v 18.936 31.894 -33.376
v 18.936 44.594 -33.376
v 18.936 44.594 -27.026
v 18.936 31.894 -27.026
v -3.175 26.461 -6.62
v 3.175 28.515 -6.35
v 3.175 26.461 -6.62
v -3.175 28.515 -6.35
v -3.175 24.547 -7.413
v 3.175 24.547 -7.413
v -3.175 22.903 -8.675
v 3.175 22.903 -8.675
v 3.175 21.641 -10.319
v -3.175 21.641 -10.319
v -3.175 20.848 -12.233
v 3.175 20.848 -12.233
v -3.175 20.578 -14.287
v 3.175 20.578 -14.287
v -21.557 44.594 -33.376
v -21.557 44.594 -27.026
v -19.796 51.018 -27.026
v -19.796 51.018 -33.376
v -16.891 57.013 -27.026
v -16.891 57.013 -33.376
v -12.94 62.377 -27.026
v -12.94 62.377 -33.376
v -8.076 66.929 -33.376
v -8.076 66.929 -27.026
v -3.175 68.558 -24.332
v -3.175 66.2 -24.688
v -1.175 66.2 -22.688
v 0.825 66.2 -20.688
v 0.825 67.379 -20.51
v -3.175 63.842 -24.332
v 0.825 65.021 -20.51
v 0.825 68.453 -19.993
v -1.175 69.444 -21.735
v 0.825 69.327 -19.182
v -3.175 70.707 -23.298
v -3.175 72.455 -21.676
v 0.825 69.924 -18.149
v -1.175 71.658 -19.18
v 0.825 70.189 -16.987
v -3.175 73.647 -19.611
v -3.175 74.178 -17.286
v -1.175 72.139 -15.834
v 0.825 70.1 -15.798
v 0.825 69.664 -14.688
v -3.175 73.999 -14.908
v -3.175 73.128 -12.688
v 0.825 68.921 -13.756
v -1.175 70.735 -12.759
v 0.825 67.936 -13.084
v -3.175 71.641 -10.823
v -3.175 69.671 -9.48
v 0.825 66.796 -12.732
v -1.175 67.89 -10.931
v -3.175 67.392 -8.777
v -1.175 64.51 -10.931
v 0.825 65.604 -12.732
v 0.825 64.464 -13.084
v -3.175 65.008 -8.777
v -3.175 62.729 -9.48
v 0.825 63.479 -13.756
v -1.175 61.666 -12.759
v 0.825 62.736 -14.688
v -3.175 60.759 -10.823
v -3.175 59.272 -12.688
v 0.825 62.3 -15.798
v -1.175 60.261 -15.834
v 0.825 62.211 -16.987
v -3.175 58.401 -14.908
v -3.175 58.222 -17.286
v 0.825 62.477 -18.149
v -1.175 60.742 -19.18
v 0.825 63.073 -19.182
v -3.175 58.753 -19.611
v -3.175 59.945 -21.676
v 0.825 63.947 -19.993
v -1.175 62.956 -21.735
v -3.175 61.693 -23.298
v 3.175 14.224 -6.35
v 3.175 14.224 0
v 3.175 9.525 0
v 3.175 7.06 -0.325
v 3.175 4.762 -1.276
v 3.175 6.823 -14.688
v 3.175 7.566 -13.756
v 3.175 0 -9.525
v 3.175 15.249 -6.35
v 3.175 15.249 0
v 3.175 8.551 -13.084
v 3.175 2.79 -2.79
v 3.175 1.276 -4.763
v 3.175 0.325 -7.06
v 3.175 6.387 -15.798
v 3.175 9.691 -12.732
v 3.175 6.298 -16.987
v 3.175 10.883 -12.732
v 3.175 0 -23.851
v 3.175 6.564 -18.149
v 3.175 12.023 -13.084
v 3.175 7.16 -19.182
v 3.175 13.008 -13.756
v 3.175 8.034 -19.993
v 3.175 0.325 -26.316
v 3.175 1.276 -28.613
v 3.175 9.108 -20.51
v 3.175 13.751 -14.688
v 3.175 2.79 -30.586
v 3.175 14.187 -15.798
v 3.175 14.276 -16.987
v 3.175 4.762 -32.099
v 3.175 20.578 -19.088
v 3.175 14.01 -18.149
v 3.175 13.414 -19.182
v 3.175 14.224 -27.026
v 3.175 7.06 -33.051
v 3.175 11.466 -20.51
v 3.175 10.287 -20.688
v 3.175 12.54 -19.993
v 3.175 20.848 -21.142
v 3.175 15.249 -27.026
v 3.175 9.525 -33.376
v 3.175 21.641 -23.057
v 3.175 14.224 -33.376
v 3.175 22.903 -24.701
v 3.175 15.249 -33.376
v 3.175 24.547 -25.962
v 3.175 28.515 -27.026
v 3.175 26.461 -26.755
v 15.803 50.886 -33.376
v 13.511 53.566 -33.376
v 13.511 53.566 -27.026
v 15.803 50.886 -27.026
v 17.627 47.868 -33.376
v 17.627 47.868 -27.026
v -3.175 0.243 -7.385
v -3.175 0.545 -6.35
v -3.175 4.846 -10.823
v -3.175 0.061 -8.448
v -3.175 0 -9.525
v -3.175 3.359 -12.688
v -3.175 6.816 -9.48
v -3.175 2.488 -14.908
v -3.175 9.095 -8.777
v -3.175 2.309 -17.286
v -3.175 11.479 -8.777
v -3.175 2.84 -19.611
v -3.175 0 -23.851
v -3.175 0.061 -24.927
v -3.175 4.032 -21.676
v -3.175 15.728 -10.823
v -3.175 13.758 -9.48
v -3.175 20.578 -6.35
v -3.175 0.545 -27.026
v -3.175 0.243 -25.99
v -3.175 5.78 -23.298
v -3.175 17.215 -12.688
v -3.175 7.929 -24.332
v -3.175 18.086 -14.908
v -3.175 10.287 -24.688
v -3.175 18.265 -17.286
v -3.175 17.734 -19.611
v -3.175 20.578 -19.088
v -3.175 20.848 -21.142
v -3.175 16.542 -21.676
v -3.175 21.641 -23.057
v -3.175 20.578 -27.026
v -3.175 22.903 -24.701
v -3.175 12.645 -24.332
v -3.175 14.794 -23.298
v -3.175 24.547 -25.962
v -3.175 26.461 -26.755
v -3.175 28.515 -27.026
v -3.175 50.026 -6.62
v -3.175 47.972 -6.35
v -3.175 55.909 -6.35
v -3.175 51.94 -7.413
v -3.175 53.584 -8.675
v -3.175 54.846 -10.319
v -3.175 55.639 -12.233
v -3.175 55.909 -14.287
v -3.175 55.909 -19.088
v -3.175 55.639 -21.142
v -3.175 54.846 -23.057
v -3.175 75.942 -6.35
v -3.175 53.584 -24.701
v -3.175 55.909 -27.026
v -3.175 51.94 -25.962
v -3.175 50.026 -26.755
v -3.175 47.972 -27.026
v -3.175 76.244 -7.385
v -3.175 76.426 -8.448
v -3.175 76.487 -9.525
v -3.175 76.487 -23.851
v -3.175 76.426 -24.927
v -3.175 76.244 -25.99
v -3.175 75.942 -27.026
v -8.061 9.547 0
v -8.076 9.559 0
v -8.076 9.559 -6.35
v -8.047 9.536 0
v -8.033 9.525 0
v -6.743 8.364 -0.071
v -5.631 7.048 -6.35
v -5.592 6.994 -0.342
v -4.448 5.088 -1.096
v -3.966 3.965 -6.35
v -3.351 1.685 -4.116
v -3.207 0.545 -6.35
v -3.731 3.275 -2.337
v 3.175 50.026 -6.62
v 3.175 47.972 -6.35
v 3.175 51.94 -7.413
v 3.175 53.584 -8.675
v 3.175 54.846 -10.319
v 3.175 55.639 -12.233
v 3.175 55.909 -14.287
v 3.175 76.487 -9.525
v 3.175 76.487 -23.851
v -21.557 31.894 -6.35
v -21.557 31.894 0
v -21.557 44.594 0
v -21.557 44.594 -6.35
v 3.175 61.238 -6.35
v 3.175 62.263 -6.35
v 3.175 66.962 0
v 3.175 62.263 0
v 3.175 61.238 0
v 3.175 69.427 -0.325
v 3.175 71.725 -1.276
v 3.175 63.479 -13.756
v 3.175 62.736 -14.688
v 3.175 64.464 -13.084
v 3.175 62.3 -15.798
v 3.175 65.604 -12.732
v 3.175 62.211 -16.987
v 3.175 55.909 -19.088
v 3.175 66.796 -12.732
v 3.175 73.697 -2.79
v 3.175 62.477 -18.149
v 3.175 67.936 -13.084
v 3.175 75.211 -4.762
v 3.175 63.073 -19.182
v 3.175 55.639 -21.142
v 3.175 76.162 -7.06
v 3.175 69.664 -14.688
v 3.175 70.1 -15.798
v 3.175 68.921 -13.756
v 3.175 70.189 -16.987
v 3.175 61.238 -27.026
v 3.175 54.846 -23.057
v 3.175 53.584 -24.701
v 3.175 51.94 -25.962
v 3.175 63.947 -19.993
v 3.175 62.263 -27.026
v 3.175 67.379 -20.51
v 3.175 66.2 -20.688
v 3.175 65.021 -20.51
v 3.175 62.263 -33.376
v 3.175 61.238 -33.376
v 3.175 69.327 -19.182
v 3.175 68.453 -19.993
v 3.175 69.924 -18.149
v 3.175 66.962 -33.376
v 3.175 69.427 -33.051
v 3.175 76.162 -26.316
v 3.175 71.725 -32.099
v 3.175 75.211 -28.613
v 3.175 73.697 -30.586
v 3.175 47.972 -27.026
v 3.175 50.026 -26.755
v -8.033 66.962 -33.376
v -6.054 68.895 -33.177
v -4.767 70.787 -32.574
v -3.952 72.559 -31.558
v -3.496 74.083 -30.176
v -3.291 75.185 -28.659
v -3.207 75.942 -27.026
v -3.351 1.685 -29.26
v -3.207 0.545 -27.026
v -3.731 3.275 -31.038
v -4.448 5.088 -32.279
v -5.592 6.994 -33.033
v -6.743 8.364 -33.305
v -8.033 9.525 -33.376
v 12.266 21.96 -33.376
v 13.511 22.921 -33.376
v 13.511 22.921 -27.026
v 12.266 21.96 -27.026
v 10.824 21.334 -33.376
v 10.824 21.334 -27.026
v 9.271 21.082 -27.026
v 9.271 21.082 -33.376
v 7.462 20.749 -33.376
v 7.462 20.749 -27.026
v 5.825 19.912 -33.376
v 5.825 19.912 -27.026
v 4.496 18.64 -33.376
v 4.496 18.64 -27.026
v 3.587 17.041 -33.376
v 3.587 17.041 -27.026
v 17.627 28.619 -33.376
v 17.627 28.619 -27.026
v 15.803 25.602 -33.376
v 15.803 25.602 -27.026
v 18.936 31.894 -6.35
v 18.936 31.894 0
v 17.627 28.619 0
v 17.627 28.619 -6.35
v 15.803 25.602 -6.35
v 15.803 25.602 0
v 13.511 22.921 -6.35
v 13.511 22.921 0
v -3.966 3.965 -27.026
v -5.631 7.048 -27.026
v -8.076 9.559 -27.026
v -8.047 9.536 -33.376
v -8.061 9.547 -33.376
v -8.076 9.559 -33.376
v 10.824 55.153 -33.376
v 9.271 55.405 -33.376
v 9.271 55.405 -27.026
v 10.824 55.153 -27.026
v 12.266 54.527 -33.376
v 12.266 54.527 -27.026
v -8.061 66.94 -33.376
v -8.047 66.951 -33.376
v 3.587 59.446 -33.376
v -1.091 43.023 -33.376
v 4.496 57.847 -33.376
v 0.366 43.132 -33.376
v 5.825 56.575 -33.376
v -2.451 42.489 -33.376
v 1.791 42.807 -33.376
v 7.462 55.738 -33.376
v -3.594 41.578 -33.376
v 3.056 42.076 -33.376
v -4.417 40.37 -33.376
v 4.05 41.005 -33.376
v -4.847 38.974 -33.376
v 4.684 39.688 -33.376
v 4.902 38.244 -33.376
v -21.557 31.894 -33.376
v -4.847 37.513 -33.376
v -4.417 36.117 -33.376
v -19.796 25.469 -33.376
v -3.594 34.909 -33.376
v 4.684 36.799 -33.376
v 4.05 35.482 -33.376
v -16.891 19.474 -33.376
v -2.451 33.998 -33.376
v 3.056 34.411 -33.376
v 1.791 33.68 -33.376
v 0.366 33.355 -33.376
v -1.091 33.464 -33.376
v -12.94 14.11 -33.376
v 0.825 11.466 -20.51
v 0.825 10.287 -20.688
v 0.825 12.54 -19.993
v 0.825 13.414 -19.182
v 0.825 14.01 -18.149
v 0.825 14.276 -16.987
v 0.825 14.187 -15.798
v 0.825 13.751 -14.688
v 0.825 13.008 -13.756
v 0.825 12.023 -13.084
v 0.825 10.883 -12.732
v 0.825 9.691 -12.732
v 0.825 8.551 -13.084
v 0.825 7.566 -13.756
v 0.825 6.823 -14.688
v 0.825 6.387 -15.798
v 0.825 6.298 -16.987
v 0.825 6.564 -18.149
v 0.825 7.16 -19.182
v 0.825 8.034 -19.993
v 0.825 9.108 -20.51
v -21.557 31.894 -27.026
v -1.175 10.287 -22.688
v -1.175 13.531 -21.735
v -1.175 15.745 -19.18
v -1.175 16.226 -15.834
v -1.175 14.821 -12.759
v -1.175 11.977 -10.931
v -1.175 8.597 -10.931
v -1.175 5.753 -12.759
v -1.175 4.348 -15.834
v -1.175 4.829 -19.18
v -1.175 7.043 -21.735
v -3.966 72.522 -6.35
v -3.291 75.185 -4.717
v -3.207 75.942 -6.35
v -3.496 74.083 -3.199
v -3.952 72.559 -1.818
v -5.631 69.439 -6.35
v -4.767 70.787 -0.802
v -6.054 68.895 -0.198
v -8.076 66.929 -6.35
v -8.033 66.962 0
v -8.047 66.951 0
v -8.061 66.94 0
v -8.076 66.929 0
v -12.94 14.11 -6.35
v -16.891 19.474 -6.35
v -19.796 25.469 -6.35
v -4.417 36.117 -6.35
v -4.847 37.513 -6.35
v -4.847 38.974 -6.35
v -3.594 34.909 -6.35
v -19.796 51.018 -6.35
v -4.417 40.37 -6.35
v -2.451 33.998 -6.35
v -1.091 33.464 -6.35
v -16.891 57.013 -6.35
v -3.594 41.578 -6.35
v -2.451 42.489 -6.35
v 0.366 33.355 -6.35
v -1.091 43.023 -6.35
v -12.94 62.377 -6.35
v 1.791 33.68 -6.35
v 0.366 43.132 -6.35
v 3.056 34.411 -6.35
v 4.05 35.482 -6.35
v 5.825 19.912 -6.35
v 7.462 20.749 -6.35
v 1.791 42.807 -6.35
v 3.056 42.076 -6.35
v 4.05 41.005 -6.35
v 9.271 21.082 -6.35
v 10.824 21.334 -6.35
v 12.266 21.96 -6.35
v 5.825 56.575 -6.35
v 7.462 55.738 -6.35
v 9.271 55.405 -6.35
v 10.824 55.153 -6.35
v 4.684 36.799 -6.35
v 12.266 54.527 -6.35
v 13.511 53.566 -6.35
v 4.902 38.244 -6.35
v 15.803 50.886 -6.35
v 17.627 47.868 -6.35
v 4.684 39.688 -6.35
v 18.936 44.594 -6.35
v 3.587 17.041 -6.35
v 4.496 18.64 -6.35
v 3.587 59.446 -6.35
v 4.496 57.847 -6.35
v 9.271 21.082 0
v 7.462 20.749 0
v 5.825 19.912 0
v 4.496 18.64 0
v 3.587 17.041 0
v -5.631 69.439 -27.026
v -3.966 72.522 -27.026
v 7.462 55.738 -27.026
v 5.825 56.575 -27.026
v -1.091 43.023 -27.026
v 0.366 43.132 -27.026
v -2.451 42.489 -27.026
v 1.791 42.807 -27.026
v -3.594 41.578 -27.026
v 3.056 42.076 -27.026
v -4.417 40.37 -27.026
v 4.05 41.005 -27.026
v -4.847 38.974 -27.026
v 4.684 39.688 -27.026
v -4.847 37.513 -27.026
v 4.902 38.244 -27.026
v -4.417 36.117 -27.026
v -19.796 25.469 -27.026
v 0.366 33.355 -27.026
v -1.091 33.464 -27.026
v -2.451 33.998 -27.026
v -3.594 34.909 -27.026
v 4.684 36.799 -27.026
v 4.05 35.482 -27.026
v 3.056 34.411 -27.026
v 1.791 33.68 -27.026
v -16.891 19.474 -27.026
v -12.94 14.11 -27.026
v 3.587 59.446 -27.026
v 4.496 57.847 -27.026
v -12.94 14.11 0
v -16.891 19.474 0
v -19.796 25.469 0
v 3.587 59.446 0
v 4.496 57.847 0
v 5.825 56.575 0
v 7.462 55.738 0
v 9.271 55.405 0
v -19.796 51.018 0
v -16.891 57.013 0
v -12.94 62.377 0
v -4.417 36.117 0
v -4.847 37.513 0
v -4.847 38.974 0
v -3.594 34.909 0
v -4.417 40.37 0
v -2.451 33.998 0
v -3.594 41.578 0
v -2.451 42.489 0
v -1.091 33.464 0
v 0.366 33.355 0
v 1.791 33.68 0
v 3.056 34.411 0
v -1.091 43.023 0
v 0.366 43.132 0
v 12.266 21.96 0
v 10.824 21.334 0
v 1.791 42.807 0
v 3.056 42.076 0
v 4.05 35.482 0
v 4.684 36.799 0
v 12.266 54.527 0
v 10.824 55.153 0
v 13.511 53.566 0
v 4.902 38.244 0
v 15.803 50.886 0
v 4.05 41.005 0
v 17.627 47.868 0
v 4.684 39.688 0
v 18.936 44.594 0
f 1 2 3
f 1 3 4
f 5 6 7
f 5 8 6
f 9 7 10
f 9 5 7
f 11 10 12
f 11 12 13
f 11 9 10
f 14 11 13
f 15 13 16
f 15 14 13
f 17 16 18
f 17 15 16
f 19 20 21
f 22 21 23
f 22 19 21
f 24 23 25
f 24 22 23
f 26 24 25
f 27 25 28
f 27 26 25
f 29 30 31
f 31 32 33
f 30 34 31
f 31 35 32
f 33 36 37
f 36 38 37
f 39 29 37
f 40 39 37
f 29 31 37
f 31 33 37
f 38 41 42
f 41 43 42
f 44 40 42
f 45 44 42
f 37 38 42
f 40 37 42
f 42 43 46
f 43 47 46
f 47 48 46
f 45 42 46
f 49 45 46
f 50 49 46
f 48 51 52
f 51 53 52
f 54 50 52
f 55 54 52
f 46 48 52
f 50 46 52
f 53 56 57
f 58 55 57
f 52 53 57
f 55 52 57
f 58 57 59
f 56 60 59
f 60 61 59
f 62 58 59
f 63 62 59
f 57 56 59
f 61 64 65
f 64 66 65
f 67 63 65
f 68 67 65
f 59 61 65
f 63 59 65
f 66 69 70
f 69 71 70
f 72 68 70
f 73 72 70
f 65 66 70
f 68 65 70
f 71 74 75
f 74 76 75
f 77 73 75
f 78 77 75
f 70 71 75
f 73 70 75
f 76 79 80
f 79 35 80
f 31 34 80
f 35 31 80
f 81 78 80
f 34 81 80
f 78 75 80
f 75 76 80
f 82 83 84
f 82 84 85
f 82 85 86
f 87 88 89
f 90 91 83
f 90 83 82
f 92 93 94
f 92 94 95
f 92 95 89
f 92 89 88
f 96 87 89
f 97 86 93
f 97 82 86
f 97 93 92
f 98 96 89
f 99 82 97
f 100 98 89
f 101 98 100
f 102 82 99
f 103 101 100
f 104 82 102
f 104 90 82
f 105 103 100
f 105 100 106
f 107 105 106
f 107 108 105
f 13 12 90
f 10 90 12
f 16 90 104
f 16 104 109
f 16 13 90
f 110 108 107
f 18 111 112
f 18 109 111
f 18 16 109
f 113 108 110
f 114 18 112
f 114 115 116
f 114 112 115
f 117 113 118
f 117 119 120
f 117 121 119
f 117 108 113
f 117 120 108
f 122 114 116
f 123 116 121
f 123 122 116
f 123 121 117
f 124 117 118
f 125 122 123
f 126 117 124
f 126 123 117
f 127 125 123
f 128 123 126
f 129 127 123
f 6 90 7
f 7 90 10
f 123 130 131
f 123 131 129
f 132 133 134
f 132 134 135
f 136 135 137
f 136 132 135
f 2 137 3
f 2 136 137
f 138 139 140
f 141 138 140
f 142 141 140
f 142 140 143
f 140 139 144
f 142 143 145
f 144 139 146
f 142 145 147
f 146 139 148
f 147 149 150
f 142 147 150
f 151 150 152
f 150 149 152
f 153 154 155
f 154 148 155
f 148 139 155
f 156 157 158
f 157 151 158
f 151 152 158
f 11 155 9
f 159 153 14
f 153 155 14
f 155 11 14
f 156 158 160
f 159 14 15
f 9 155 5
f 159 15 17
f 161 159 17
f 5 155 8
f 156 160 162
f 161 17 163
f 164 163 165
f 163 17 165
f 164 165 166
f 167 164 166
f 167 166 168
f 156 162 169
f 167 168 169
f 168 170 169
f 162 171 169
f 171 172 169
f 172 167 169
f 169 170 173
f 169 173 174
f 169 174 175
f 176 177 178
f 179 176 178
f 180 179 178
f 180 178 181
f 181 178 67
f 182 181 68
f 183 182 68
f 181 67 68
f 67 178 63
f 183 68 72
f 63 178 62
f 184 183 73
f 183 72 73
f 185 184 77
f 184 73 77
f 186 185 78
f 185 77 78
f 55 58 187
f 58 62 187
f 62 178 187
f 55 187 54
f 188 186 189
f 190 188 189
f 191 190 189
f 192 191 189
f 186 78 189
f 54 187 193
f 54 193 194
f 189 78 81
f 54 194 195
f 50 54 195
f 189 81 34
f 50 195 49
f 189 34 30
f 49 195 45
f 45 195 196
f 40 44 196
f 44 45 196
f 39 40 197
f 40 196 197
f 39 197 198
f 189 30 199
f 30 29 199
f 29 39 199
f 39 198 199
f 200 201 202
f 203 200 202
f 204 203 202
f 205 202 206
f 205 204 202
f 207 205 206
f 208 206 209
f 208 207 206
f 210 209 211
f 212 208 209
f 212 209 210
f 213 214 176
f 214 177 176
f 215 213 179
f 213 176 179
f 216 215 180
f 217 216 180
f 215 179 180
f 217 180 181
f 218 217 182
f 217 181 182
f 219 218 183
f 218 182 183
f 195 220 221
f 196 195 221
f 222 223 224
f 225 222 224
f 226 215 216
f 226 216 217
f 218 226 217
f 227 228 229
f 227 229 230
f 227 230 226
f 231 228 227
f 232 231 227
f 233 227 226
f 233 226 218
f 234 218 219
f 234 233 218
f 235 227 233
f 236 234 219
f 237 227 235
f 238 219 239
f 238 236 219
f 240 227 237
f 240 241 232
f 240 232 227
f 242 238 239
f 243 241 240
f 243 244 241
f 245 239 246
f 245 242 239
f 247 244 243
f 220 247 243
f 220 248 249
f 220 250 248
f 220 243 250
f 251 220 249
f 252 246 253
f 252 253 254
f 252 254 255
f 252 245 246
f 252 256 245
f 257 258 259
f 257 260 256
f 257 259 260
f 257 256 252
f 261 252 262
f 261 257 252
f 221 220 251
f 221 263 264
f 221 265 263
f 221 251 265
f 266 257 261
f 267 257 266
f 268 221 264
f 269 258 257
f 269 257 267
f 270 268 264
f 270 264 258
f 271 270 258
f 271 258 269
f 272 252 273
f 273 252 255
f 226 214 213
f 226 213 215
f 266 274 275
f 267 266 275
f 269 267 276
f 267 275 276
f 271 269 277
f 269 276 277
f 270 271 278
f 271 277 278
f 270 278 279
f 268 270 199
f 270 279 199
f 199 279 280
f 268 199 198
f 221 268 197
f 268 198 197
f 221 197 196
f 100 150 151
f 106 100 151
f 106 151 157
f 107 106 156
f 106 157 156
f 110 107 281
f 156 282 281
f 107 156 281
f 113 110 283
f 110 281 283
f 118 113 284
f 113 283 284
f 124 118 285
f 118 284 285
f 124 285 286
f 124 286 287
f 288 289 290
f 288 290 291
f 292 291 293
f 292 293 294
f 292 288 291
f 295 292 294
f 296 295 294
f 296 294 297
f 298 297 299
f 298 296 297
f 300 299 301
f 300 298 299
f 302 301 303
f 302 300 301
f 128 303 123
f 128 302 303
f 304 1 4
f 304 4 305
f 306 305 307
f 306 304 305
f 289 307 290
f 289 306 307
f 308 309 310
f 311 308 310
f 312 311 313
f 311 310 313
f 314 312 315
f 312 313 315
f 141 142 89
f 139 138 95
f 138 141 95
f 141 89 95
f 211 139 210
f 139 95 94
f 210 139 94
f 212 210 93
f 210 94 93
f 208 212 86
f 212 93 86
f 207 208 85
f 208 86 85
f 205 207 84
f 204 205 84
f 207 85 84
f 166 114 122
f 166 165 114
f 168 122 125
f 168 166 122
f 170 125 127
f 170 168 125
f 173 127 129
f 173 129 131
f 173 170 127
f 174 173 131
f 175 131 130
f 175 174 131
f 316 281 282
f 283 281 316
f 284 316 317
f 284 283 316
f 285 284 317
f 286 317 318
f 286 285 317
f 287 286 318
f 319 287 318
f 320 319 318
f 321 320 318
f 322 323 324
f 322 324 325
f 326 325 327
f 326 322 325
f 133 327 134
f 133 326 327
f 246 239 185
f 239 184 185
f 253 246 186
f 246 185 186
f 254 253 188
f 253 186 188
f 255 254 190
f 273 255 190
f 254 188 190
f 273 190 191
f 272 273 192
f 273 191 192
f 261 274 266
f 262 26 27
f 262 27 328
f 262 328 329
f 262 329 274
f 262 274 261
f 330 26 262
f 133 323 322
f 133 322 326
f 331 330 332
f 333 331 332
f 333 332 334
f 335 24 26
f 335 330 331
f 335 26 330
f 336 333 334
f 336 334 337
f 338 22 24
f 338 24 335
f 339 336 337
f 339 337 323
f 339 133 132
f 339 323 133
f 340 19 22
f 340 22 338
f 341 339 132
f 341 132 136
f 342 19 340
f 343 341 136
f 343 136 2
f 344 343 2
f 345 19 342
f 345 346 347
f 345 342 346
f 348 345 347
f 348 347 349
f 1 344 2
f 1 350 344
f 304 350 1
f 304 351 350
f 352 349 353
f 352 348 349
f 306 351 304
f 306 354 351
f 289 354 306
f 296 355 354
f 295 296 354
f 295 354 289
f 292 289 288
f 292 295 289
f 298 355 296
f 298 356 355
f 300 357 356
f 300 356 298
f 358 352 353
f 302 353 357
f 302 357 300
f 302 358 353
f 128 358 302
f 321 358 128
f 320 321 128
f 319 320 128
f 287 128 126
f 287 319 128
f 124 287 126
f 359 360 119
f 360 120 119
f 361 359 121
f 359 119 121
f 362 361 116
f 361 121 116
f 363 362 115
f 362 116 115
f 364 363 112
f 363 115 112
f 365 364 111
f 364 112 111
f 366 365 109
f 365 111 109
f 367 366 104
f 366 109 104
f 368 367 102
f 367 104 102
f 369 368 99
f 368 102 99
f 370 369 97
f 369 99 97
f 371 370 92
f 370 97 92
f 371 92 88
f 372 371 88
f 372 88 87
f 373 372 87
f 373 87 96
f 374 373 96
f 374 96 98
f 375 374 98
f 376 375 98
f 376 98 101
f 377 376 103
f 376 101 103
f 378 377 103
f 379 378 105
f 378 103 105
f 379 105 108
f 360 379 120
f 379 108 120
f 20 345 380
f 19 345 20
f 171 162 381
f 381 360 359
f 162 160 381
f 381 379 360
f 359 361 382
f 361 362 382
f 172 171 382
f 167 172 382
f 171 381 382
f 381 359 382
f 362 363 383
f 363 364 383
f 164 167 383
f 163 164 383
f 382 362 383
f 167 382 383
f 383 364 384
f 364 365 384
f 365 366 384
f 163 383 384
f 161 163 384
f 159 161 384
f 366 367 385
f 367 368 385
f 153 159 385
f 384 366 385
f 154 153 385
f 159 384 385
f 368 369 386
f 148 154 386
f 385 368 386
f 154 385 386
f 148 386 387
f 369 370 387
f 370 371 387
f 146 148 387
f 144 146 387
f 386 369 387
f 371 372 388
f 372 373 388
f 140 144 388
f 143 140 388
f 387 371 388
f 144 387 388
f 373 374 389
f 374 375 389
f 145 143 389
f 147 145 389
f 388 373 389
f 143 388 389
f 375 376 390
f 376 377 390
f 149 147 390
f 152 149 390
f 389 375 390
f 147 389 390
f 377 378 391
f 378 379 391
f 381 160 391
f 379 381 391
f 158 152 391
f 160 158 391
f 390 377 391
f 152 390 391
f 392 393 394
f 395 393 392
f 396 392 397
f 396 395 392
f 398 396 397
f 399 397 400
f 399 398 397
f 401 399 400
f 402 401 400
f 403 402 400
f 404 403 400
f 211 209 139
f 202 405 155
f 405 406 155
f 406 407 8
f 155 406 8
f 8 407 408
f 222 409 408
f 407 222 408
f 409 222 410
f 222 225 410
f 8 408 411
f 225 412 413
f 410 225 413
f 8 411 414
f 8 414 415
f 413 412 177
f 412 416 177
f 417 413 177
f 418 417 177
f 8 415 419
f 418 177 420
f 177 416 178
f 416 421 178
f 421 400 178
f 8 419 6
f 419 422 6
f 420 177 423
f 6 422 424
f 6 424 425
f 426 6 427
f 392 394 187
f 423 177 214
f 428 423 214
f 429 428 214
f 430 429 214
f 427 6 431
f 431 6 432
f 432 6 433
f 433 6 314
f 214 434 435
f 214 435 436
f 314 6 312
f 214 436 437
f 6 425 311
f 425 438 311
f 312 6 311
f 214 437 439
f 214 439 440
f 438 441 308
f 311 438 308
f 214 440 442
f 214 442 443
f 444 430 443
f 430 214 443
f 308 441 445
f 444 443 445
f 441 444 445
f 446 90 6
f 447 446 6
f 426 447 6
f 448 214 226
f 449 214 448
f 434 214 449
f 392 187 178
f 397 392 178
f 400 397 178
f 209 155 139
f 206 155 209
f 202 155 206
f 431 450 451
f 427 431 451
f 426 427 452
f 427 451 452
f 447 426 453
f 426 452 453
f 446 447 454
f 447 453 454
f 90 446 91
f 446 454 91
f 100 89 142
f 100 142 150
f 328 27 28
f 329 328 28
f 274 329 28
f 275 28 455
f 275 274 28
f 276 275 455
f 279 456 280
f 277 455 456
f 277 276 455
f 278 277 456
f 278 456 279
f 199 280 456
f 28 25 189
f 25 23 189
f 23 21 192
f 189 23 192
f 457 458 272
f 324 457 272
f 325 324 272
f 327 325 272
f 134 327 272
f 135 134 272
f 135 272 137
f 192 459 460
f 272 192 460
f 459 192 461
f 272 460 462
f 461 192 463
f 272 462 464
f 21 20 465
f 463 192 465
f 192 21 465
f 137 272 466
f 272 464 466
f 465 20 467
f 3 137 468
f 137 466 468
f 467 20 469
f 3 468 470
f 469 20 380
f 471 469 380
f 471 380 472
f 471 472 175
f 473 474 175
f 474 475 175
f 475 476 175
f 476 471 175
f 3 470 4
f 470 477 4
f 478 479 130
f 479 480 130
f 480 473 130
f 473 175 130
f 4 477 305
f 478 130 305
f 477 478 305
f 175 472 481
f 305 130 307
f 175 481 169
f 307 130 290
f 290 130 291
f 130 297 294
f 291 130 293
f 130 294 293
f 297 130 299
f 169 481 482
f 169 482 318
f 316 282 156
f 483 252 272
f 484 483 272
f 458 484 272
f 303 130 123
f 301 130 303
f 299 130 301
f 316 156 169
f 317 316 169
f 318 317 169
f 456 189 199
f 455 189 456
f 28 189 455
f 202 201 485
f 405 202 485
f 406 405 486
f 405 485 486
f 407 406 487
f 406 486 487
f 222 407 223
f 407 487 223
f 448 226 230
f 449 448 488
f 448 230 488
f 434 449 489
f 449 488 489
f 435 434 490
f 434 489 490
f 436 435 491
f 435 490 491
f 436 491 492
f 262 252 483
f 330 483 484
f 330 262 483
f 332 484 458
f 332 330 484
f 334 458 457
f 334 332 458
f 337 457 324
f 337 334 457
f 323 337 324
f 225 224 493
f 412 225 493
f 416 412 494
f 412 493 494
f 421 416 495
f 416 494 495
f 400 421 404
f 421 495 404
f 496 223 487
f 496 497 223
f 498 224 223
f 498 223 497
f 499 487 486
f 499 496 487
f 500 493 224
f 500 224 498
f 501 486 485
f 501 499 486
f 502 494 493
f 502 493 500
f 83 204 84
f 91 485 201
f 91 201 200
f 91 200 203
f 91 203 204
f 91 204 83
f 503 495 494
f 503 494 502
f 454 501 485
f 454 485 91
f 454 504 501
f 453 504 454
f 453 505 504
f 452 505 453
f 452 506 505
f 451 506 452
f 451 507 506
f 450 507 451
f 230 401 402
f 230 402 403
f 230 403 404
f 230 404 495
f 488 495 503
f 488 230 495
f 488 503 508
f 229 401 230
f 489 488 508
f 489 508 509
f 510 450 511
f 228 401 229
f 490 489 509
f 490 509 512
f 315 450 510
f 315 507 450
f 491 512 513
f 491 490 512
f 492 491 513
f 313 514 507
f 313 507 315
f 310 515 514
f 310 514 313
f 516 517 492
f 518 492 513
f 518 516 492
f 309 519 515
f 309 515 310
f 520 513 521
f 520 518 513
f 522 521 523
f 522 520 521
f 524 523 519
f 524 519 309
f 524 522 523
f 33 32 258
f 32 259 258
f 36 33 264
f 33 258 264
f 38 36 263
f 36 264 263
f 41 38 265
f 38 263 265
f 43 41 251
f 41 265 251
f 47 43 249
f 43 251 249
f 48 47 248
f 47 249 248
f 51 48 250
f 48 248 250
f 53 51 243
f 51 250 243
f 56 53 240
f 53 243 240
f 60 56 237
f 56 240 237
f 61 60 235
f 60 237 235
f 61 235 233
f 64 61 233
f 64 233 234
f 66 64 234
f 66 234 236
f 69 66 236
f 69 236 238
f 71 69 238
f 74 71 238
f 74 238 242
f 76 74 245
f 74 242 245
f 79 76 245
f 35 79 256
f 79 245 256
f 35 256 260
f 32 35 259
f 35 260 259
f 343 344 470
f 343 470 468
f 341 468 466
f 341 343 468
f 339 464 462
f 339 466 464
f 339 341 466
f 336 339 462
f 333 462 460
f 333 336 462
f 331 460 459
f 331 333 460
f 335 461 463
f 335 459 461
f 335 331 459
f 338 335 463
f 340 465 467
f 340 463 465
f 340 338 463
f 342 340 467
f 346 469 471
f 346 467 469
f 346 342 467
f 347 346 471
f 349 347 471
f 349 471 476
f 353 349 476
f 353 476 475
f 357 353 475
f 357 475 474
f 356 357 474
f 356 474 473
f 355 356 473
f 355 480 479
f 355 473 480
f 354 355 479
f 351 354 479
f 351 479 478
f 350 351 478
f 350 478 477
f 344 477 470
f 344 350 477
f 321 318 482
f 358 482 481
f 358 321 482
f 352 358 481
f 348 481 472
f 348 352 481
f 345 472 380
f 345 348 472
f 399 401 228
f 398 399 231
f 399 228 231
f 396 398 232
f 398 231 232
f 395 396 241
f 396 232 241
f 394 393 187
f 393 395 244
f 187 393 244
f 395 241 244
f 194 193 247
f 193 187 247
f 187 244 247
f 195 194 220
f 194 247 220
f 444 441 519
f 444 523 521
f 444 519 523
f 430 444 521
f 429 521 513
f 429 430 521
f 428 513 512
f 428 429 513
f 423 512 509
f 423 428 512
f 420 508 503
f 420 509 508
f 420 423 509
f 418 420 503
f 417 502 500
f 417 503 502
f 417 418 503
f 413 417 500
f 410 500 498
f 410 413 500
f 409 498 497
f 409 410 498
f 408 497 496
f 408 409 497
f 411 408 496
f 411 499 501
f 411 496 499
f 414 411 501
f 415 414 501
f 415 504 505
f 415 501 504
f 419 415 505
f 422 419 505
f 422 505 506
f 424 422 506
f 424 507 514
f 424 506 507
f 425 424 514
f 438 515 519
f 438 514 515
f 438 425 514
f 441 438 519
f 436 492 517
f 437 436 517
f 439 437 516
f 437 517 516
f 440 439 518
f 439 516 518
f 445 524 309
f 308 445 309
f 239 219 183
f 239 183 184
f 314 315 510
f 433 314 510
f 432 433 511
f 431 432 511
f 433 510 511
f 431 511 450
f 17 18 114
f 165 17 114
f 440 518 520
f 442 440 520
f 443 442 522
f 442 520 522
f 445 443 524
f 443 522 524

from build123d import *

# Parameters (mm, degrees)
SKETCH2_W                                            = 33.3756
SKETCH2_H                                            = 76.48702
BODY_EXTRUDE_DEPTH                                   = 3.175
ROUND_EXTRUDE_DEPTH                                  = 6.35
SKETCH5_W                                            = 20.6756
SKETCH5_H                                            = 35.3314
RECTANGLE_CUT_DEPTH                                  = 88.03940876
BACK_EDGE_FILLET_R                                   = 12.7
OUTER_FILLET_R                                       = 9.525
INNER_FILLET_R                                       = 7.9375
CSK_FOR_M8_CROSS_COUNTERSUNK_HEAD_SCREW1_D           = 8
CSK_FOR_M8_CROSS_COUNTERSUNK_HEAD_SCREW1_DEPTH       = 33.782
CSK_FOR_M8_CROSS_COUNTERSUNK_HEAD_SCREW1_CSINK_D     = 16
CSK_FOR_M8_CROSS_COUNTERSUNK_HEAD_SCREW1_CSINK_ANGLE = 90
VERTICAL_HOLES_DEPTH                                 = 87.191021329
VERTICAL_HOLES_DEPTH_BACK                            = 87.191021329
SKETCH9_R                                            = 4.9022


with BuildPart() as part:
    # Sketch2 → Body Extrude (new, symmetric)
    with BuildSketch(Plane(origin=(0, 0, 0), x_dir=(0, 0, -1), z_dir=(1, 0, 0))):
        with Locations((16.6878, 38.24351)):
            Rectangle(SKETCH2_W, SKETCH2_H)
    extrude(amount=BODY_EXTRUDE_DEPTH, both=True)

    # Sketch3 → Round Extrude (add)
    with BuildSketch(Plane.XY):
        with BuildLine():
            Line((18.936083517, 44.59351), (18.936083517, 31.89351))
            ThreePointArc((18.936083517, 31.89351), (16.776632986, 27.073011115), (13.511311574, 22.921130557))
            ThreePointArc((13.511311574, 22.921130557), (11.564427885, 21.602067983), (9.271, 21.082))
            ThreePointArc((9.271, 21.082), (4.758252665, 18.954997631), (3.175, 14.224))
            Line((3.175, 14.224), (-3.175, 6.35))
            ThreePointArc((-3.175, 6.35), (-15.275957763, 17.02760796), (-21.556837243, 31.89351))
            Line((-21.556837243, 31.89351), (-21.556837243, 44.59351))
            ThreePointArc((-21.556837243, 44.59351), (-15.275957763, 59.45941204), (-3.175, 70.13702))
            Line((-3.175, 70.13702), (3.175, 62.26302))
            ThreePointArc((3.175, 62.26302), (4.758252665, 57.532022369), (9.271, 55.40502))
            ThreePointArc((9.271, 55.40502), (11.564427885, 54.884952017), (13.511311574, 53.565889443))
            ThreePointArc((13.511311574, 53.565889443), (16.776632986, 49.414008885), (18.936083517, 44.59351))
        make_face()
    round_extrude = extrude(amount=-ROUND_EXTRUDE_DEPTH)

    # Round Extrude Mirrored: Round Extrude across plane
    add(round_extrude.mirror(Plane(origin=(0, 0, -16.6878), x_dir=(1, 0, 0), z_dir=(0, 0, -1))))

    # Sketch5 → Rectangle Cut (cut, through all)
    with BuildSketch(Plane(origin=(3.175, 0, 0), x_dir=(0, 0, -1), z_dir=(1, 0, 0))):
        with Locations((16.6878, 38.24351)):
            Rectangle(SKETCH5_W, SKETCH5_H)
    extrude(amount=-RECTANGLE_CUT_DEPTH, mode=Mode.SUBTRACT)

    # Back Edge Fillet
    # the kernel refuses this fillet: 12.7 mm, written as the material it adds along each edge
    with BuildSketch(Plane(origin=(-3.175, 6.35, -33.3756), x_dir=(-0.8366334248395991, 0.5477631901115323, 0), z_dir=(0, 0, 1)), Plane(origin=(-3.175, 70.13702, 0), x_dir=(-0.8366334248396001, -0.5477631901115311, 0), z_dir=(0, 0, -1))) as back_edge_fillet_piece_1:
        with BuildLine():
            CenterArc((6.881526007, 12.658647204), BACK_EDGE_FILLET_R, 215.339993456, 50.03506631)
            Line((-3.478296257, 5.312622248), (-3.685492702, 5.165701749))
            ThreePointArc((-3.685492702, 5.165701749), (-1.951653019, 2.517179274), (-0.21250489, -0.13913185))
            Line((-0.21250489, -0.13913185), (0.020480732, -0.253172944))
            ThreePointArc((0.020480732, -0.253172944), (2.928744699, -0.135731002), (5.837008667, -0.253172944))
            Line((5.837008667, -0.253172944), (5.857489399, 0))
        make_face()
    extrude(amount=6.35)
    with BuildSketch(Plane(origin=(-3.175, 6.35, 0), x_dir=(-0.8366334248395991, 0.5477631901115323, 0), z_dir=(0, 0, -1)), Plane(origin=(-3.175, 70.13702, -33.3756), x_dir=(-0.8366334248396001, -0.5477631901115311, 0), z_dir=(0, 0, 1))) as back_edge_fillet_piece_2:
        with BuildLine():
            CenterArc((6.881526007, -12.658647204), BACK_EDGE_FILLET_R, 94.624940234, 50.03506631)
            Line((-3.478296257, -5.312622248), (-3.685492702, -5.165701749))
            ThreePointArc((-3.685492702, -5.165701749), (-1.951653019, -2.517179274), (-0.21250489, 0.13913185))
            Line((-0.21250489, 0.13913185), (0.020480732, 0.253172944))
            ThreePointArc((0.020480732, 0.253172944), (2.928744699, 0.135731002), (5.837008667, 0.253172944))
            Line((5.837008667, 0.253172944), (5.857489399, 0))
        make_face()
    extrude(amount=6.35)

    # Outer Fillet
    # the kernel refuses this fillet: 9.525 mm, written as the material it takes off along each edge
    with BuildSketch(Plane(origin=(26.9875, 76.48702, 0), x_dir=(0, 0, -1), z_dir=(-1, 0, 0)), Plane(origin=(-26.9875, 76.48702, -33.3756), x_dir=(0, 0, 1), z_dir=(1, 0, 0)), Plane(origin=(-26.9875, 0, -33.3756), x_dir=(0, 1, 0), z_dir=(1, 0, 0)), Plane(origin=(26.9875, 0, 0), x_dir=(0, 1, 0), z_dir=(-1, 0, 0))) as outer_fillet_piece_1:
        with BuildLine():
            CenterArc((OUTER_FILLET_R, OUTER_FILLET_R), OUTER_FILLET_R, 180, 90)
            Line((0, OUTER_FILLET_R), (0, 0))
            Line((0, 0), (OUTER_FILLET_R, 0))
        make_face()
    extrude(amount=53.975, mode=Mode.SUBTRACT)

    # Inner Fillet
    inner_fillet_edges = [part.edges().sort_by_distance(p)[0] for p in [
        (0, 55.90921, -27.0256),
        (0, 20.57781, -6.35),
        (0, 55.90921, -6.35),
        (0, 20.57781, -27.0256),
    ]]
    fillet(inner_fillet_edges, radius=INNER_FILLET_R)

    # CSK for M8 Cross Countersunk Head Screw1
    with Locations(Plane.ZY.offset(3.175)):
        with Locations((-16.6878, 66.20002), (-16.6878, 10.287)):
            CounterSinkHole(CSK_FOR_M8_CROSS_COUNTERSUNK_HEAD_SCREW1_D / 2, CSK_FOR_M8_CROSS_COUNTERSUNK_HEAD_SCREW1_CSINK_D / 2, depth=CSK_FOR_M8_CROSS_COUNTERSUNK_HEAD_SCREW1_DEPTH, counter_sink_angle=CSK_FOR_M8_CROSS_COUNTERSUNK_HEAD_SCREW1_CSINK_ANGLE)

    # Sketch9 → Vertical Holes (cut, two sides: drawn at the far end of the back side and taken through both)
    with BuildSketch(Plane.XY.offset(-VERTICAL_HOLES_DEPTH_BACK)):
        with Locations((0, 38.24351)):
            Circle(SKETCH9_R)
    extrude(amount=VERTICAL_HOLES_DEPTH + VERTICAL_HOLES_DEPTH_BACK, mode=Mode.SUBTRACT)


solid = part.part
